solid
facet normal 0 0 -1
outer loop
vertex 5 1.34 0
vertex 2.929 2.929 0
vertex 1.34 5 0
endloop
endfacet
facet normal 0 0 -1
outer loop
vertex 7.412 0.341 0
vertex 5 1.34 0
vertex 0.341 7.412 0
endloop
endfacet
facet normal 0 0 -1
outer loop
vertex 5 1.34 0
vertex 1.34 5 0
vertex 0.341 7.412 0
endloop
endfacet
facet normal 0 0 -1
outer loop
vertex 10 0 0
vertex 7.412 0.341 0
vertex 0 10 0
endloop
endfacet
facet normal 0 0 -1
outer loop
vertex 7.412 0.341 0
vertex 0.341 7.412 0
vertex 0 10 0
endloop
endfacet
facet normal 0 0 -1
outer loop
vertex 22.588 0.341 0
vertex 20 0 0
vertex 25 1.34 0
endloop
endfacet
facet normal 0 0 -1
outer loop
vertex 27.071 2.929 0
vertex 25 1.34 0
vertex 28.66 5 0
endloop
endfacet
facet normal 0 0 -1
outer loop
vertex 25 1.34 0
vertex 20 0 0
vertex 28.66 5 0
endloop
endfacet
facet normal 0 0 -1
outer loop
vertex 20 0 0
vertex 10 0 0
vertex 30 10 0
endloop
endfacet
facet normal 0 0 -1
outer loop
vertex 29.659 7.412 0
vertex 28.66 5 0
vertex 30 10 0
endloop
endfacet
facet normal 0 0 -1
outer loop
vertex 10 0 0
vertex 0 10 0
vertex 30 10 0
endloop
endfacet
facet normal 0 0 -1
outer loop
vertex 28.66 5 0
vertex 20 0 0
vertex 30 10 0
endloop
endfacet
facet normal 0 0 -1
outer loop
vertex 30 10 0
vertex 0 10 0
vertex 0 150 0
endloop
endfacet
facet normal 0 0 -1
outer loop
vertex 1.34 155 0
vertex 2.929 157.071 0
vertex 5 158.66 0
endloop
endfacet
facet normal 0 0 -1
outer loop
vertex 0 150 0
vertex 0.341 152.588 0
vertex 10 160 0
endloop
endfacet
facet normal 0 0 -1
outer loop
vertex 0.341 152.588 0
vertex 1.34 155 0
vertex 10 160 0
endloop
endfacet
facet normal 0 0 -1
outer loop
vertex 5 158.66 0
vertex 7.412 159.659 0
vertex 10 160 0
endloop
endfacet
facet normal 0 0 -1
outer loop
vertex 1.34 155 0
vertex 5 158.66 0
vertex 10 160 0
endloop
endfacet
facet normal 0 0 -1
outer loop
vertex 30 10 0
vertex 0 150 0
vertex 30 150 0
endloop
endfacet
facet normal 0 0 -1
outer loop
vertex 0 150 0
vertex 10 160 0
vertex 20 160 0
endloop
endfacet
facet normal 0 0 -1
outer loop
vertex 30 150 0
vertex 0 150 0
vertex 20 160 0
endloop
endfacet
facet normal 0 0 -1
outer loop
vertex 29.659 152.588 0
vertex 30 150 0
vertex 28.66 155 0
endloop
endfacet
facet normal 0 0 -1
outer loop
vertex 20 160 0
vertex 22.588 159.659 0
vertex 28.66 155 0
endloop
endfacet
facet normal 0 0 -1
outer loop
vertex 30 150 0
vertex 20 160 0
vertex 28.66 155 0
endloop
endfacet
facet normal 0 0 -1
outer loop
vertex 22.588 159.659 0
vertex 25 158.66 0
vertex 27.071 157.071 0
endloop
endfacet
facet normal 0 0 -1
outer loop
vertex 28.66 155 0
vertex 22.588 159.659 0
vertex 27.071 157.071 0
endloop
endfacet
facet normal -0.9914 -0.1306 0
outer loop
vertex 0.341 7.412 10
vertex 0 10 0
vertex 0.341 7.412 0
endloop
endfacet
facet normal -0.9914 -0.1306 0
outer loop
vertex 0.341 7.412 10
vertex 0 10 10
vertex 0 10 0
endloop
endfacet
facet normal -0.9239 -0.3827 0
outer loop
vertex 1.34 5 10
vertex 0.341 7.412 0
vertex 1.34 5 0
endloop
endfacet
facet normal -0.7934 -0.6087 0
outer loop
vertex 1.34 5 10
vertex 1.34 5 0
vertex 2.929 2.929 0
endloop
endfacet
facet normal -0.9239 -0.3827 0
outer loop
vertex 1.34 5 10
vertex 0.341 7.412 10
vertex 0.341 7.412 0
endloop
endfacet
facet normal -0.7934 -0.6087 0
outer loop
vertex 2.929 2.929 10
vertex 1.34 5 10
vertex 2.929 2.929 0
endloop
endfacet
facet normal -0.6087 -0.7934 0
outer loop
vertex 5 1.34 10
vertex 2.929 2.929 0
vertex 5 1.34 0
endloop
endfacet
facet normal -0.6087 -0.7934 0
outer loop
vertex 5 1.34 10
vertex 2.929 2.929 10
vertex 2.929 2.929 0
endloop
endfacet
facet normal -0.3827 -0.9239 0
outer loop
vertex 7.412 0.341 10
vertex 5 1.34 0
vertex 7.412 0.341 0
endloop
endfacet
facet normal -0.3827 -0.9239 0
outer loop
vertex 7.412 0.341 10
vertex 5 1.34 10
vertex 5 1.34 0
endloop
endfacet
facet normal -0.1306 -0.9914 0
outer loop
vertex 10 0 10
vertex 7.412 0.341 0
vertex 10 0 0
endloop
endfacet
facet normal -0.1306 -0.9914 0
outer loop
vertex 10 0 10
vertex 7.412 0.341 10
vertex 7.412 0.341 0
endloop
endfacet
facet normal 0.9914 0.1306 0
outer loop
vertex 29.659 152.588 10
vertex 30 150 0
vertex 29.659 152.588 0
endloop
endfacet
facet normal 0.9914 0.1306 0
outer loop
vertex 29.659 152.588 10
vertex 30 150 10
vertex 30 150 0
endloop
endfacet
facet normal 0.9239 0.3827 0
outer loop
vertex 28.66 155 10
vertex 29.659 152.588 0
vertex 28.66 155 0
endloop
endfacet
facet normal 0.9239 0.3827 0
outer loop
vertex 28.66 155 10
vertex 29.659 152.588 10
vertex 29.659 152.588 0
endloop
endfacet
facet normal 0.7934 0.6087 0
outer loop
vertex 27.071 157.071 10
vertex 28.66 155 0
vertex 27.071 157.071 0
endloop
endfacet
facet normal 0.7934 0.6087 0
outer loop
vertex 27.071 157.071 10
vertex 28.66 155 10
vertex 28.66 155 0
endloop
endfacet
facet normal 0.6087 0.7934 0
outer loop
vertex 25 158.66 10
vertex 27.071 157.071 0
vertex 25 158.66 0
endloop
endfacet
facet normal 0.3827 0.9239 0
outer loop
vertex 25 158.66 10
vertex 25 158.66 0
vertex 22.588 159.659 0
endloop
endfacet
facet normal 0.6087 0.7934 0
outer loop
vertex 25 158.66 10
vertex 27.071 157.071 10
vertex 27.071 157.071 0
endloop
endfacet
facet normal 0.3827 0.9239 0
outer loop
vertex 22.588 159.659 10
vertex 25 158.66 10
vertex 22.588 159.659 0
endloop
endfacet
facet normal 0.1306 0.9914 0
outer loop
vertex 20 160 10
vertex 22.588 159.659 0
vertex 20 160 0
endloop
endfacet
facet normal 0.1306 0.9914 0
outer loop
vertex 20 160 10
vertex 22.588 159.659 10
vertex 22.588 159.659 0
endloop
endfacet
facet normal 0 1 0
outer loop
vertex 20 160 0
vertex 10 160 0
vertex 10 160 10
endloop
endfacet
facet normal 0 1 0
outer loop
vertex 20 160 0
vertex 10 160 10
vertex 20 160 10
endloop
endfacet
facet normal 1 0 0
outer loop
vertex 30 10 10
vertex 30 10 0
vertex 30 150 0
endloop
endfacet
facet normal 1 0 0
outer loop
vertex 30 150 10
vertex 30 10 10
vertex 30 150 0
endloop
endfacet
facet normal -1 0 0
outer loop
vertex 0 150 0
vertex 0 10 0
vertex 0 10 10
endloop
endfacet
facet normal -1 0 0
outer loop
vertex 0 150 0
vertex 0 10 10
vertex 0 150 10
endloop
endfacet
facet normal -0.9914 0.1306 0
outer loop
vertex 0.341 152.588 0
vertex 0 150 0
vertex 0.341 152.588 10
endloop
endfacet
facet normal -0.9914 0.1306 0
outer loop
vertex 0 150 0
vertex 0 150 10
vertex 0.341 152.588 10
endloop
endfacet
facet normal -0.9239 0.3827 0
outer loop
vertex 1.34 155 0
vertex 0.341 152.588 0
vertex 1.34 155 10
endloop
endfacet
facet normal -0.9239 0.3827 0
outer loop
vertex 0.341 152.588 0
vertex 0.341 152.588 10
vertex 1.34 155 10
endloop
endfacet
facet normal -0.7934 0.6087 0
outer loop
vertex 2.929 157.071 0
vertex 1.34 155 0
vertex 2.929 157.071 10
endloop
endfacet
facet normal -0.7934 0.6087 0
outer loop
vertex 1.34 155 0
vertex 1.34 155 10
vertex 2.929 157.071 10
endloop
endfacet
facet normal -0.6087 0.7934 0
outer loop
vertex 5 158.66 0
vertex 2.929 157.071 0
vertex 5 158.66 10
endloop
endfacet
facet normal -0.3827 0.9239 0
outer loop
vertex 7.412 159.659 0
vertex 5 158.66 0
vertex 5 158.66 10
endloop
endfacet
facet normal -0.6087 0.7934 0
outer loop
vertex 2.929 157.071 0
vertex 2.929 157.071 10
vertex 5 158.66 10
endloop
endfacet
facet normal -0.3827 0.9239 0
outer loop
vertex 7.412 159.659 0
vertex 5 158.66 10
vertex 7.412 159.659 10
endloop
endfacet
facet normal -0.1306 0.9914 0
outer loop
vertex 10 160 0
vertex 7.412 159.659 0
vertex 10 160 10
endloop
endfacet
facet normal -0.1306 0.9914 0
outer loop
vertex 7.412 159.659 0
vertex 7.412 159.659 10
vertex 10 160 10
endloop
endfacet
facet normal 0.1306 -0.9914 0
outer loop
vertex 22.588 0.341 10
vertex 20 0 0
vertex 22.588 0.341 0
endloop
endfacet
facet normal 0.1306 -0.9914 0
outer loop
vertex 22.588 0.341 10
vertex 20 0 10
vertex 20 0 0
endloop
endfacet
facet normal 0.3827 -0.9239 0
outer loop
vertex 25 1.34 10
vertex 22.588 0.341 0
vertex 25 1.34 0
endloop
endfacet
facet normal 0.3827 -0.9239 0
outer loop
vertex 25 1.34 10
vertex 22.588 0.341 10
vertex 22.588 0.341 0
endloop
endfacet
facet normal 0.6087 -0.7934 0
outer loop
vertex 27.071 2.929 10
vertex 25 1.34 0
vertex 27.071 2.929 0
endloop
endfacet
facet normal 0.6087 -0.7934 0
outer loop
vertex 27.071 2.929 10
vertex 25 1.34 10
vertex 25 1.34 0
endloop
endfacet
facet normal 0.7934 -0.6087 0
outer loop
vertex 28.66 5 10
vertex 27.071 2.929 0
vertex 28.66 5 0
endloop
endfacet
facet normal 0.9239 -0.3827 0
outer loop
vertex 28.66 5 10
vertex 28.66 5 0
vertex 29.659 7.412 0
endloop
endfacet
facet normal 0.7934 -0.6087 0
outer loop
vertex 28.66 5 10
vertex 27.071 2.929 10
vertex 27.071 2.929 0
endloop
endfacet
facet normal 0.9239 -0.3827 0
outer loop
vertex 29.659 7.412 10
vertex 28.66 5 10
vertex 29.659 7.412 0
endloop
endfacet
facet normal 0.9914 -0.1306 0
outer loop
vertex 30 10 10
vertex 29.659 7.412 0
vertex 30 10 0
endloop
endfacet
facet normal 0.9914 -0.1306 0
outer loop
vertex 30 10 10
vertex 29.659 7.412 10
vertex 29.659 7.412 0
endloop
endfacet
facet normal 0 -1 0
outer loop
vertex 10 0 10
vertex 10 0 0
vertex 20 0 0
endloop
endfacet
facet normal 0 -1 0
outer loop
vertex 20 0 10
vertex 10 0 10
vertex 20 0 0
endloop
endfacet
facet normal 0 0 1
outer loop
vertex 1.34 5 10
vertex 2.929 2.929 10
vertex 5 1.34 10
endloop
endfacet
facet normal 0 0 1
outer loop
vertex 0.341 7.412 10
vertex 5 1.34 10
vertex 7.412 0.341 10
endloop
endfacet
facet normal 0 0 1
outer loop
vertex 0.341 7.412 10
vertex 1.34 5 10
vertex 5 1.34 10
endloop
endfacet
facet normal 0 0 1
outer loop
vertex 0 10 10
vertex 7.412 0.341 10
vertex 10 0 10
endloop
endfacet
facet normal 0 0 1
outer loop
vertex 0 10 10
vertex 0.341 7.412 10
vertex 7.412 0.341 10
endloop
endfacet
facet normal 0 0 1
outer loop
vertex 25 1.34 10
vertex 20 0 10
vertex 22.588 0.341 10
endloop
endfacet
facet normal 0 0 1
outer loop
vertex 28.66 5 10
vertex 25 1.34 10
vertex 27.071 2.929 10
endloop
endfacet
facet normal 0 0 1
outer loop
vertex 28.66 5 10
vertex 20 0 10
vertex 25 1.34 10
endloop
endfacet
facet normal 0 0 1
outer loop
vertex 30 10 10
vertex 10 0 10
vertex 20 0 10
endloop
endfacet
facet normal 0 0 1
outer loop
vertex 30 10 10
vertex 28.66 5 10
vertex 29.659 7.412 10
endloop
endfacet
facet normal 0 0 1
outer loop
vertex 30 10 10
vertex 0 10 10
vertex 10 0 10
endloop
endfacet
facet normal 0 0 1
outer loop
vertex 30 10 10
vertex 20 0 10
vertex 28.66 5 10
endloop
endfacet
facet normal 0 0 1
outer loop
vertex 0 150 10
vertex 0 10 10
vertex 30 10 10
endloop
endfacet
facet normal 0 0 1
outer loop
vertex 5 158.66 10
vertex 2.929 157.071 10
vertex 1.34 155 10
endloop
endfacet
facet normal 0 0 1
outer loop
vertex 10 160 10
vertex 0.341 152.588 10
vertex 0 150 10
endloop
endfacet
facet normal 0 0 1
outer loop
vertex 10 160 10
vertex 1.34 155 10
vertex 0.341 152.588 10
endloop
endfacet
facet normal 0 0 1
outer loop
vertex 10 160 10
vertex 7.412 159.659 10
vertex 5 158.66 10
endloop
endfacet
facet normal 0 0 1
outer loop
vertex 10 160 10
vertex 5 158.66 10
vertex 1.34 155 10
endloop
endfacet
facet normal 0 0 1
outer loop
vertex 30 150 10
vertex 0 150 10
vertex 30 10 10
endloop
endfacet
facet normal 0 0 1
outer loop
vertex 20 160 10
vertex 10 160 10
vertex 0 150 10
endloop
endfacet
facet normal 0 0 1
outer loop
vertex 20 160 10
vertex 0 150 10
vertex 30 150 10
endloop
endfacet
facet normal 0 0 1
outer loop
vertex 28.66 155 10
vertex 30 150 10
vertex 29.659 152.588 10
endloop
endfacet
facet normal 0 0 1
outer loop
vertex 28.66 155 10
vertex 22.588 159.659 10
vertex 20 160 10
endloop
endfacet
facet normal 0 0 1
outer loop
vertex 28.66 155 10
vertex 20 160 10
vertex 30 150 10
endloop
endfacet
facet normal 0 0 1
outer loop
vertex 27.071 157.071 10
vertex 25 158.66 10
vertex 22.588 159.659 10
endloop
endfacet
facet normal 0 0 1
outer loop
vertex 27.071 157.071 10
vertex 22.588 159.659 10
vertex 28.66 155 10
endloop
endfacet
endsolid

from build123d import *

# Parameters (mm, degrees)
SKICA1_W                = 30
SKICA1_H                = 160
P_IDAT_VYSUNUT_M1_DEPTH = 10
ZAOBLIT1_R              = 10


with BuildPart() as part:
    # Skica1 → Přidat vysunutím1 (new body)
    with BuildSketch(Plane.XY):
        with Locations((15, 80)):
            Rectangle(SKICA1_W, SKICA1_H)
    extrude(amount=P_IDAT_VYSUNUT_M1_DEPTH)

    # Zaoblit1
    zaoblit1_edges = [part.edges().sort_by_distance(p)[0] for p in [
        (0, 160, 5),
        (30, 160, 5),
        (30, 0, 5),
        (0, 0, 5),
    ]]
    fillet(zaoblit1_edges, radius=ZAOBLIT1_R)


solid = part.part
